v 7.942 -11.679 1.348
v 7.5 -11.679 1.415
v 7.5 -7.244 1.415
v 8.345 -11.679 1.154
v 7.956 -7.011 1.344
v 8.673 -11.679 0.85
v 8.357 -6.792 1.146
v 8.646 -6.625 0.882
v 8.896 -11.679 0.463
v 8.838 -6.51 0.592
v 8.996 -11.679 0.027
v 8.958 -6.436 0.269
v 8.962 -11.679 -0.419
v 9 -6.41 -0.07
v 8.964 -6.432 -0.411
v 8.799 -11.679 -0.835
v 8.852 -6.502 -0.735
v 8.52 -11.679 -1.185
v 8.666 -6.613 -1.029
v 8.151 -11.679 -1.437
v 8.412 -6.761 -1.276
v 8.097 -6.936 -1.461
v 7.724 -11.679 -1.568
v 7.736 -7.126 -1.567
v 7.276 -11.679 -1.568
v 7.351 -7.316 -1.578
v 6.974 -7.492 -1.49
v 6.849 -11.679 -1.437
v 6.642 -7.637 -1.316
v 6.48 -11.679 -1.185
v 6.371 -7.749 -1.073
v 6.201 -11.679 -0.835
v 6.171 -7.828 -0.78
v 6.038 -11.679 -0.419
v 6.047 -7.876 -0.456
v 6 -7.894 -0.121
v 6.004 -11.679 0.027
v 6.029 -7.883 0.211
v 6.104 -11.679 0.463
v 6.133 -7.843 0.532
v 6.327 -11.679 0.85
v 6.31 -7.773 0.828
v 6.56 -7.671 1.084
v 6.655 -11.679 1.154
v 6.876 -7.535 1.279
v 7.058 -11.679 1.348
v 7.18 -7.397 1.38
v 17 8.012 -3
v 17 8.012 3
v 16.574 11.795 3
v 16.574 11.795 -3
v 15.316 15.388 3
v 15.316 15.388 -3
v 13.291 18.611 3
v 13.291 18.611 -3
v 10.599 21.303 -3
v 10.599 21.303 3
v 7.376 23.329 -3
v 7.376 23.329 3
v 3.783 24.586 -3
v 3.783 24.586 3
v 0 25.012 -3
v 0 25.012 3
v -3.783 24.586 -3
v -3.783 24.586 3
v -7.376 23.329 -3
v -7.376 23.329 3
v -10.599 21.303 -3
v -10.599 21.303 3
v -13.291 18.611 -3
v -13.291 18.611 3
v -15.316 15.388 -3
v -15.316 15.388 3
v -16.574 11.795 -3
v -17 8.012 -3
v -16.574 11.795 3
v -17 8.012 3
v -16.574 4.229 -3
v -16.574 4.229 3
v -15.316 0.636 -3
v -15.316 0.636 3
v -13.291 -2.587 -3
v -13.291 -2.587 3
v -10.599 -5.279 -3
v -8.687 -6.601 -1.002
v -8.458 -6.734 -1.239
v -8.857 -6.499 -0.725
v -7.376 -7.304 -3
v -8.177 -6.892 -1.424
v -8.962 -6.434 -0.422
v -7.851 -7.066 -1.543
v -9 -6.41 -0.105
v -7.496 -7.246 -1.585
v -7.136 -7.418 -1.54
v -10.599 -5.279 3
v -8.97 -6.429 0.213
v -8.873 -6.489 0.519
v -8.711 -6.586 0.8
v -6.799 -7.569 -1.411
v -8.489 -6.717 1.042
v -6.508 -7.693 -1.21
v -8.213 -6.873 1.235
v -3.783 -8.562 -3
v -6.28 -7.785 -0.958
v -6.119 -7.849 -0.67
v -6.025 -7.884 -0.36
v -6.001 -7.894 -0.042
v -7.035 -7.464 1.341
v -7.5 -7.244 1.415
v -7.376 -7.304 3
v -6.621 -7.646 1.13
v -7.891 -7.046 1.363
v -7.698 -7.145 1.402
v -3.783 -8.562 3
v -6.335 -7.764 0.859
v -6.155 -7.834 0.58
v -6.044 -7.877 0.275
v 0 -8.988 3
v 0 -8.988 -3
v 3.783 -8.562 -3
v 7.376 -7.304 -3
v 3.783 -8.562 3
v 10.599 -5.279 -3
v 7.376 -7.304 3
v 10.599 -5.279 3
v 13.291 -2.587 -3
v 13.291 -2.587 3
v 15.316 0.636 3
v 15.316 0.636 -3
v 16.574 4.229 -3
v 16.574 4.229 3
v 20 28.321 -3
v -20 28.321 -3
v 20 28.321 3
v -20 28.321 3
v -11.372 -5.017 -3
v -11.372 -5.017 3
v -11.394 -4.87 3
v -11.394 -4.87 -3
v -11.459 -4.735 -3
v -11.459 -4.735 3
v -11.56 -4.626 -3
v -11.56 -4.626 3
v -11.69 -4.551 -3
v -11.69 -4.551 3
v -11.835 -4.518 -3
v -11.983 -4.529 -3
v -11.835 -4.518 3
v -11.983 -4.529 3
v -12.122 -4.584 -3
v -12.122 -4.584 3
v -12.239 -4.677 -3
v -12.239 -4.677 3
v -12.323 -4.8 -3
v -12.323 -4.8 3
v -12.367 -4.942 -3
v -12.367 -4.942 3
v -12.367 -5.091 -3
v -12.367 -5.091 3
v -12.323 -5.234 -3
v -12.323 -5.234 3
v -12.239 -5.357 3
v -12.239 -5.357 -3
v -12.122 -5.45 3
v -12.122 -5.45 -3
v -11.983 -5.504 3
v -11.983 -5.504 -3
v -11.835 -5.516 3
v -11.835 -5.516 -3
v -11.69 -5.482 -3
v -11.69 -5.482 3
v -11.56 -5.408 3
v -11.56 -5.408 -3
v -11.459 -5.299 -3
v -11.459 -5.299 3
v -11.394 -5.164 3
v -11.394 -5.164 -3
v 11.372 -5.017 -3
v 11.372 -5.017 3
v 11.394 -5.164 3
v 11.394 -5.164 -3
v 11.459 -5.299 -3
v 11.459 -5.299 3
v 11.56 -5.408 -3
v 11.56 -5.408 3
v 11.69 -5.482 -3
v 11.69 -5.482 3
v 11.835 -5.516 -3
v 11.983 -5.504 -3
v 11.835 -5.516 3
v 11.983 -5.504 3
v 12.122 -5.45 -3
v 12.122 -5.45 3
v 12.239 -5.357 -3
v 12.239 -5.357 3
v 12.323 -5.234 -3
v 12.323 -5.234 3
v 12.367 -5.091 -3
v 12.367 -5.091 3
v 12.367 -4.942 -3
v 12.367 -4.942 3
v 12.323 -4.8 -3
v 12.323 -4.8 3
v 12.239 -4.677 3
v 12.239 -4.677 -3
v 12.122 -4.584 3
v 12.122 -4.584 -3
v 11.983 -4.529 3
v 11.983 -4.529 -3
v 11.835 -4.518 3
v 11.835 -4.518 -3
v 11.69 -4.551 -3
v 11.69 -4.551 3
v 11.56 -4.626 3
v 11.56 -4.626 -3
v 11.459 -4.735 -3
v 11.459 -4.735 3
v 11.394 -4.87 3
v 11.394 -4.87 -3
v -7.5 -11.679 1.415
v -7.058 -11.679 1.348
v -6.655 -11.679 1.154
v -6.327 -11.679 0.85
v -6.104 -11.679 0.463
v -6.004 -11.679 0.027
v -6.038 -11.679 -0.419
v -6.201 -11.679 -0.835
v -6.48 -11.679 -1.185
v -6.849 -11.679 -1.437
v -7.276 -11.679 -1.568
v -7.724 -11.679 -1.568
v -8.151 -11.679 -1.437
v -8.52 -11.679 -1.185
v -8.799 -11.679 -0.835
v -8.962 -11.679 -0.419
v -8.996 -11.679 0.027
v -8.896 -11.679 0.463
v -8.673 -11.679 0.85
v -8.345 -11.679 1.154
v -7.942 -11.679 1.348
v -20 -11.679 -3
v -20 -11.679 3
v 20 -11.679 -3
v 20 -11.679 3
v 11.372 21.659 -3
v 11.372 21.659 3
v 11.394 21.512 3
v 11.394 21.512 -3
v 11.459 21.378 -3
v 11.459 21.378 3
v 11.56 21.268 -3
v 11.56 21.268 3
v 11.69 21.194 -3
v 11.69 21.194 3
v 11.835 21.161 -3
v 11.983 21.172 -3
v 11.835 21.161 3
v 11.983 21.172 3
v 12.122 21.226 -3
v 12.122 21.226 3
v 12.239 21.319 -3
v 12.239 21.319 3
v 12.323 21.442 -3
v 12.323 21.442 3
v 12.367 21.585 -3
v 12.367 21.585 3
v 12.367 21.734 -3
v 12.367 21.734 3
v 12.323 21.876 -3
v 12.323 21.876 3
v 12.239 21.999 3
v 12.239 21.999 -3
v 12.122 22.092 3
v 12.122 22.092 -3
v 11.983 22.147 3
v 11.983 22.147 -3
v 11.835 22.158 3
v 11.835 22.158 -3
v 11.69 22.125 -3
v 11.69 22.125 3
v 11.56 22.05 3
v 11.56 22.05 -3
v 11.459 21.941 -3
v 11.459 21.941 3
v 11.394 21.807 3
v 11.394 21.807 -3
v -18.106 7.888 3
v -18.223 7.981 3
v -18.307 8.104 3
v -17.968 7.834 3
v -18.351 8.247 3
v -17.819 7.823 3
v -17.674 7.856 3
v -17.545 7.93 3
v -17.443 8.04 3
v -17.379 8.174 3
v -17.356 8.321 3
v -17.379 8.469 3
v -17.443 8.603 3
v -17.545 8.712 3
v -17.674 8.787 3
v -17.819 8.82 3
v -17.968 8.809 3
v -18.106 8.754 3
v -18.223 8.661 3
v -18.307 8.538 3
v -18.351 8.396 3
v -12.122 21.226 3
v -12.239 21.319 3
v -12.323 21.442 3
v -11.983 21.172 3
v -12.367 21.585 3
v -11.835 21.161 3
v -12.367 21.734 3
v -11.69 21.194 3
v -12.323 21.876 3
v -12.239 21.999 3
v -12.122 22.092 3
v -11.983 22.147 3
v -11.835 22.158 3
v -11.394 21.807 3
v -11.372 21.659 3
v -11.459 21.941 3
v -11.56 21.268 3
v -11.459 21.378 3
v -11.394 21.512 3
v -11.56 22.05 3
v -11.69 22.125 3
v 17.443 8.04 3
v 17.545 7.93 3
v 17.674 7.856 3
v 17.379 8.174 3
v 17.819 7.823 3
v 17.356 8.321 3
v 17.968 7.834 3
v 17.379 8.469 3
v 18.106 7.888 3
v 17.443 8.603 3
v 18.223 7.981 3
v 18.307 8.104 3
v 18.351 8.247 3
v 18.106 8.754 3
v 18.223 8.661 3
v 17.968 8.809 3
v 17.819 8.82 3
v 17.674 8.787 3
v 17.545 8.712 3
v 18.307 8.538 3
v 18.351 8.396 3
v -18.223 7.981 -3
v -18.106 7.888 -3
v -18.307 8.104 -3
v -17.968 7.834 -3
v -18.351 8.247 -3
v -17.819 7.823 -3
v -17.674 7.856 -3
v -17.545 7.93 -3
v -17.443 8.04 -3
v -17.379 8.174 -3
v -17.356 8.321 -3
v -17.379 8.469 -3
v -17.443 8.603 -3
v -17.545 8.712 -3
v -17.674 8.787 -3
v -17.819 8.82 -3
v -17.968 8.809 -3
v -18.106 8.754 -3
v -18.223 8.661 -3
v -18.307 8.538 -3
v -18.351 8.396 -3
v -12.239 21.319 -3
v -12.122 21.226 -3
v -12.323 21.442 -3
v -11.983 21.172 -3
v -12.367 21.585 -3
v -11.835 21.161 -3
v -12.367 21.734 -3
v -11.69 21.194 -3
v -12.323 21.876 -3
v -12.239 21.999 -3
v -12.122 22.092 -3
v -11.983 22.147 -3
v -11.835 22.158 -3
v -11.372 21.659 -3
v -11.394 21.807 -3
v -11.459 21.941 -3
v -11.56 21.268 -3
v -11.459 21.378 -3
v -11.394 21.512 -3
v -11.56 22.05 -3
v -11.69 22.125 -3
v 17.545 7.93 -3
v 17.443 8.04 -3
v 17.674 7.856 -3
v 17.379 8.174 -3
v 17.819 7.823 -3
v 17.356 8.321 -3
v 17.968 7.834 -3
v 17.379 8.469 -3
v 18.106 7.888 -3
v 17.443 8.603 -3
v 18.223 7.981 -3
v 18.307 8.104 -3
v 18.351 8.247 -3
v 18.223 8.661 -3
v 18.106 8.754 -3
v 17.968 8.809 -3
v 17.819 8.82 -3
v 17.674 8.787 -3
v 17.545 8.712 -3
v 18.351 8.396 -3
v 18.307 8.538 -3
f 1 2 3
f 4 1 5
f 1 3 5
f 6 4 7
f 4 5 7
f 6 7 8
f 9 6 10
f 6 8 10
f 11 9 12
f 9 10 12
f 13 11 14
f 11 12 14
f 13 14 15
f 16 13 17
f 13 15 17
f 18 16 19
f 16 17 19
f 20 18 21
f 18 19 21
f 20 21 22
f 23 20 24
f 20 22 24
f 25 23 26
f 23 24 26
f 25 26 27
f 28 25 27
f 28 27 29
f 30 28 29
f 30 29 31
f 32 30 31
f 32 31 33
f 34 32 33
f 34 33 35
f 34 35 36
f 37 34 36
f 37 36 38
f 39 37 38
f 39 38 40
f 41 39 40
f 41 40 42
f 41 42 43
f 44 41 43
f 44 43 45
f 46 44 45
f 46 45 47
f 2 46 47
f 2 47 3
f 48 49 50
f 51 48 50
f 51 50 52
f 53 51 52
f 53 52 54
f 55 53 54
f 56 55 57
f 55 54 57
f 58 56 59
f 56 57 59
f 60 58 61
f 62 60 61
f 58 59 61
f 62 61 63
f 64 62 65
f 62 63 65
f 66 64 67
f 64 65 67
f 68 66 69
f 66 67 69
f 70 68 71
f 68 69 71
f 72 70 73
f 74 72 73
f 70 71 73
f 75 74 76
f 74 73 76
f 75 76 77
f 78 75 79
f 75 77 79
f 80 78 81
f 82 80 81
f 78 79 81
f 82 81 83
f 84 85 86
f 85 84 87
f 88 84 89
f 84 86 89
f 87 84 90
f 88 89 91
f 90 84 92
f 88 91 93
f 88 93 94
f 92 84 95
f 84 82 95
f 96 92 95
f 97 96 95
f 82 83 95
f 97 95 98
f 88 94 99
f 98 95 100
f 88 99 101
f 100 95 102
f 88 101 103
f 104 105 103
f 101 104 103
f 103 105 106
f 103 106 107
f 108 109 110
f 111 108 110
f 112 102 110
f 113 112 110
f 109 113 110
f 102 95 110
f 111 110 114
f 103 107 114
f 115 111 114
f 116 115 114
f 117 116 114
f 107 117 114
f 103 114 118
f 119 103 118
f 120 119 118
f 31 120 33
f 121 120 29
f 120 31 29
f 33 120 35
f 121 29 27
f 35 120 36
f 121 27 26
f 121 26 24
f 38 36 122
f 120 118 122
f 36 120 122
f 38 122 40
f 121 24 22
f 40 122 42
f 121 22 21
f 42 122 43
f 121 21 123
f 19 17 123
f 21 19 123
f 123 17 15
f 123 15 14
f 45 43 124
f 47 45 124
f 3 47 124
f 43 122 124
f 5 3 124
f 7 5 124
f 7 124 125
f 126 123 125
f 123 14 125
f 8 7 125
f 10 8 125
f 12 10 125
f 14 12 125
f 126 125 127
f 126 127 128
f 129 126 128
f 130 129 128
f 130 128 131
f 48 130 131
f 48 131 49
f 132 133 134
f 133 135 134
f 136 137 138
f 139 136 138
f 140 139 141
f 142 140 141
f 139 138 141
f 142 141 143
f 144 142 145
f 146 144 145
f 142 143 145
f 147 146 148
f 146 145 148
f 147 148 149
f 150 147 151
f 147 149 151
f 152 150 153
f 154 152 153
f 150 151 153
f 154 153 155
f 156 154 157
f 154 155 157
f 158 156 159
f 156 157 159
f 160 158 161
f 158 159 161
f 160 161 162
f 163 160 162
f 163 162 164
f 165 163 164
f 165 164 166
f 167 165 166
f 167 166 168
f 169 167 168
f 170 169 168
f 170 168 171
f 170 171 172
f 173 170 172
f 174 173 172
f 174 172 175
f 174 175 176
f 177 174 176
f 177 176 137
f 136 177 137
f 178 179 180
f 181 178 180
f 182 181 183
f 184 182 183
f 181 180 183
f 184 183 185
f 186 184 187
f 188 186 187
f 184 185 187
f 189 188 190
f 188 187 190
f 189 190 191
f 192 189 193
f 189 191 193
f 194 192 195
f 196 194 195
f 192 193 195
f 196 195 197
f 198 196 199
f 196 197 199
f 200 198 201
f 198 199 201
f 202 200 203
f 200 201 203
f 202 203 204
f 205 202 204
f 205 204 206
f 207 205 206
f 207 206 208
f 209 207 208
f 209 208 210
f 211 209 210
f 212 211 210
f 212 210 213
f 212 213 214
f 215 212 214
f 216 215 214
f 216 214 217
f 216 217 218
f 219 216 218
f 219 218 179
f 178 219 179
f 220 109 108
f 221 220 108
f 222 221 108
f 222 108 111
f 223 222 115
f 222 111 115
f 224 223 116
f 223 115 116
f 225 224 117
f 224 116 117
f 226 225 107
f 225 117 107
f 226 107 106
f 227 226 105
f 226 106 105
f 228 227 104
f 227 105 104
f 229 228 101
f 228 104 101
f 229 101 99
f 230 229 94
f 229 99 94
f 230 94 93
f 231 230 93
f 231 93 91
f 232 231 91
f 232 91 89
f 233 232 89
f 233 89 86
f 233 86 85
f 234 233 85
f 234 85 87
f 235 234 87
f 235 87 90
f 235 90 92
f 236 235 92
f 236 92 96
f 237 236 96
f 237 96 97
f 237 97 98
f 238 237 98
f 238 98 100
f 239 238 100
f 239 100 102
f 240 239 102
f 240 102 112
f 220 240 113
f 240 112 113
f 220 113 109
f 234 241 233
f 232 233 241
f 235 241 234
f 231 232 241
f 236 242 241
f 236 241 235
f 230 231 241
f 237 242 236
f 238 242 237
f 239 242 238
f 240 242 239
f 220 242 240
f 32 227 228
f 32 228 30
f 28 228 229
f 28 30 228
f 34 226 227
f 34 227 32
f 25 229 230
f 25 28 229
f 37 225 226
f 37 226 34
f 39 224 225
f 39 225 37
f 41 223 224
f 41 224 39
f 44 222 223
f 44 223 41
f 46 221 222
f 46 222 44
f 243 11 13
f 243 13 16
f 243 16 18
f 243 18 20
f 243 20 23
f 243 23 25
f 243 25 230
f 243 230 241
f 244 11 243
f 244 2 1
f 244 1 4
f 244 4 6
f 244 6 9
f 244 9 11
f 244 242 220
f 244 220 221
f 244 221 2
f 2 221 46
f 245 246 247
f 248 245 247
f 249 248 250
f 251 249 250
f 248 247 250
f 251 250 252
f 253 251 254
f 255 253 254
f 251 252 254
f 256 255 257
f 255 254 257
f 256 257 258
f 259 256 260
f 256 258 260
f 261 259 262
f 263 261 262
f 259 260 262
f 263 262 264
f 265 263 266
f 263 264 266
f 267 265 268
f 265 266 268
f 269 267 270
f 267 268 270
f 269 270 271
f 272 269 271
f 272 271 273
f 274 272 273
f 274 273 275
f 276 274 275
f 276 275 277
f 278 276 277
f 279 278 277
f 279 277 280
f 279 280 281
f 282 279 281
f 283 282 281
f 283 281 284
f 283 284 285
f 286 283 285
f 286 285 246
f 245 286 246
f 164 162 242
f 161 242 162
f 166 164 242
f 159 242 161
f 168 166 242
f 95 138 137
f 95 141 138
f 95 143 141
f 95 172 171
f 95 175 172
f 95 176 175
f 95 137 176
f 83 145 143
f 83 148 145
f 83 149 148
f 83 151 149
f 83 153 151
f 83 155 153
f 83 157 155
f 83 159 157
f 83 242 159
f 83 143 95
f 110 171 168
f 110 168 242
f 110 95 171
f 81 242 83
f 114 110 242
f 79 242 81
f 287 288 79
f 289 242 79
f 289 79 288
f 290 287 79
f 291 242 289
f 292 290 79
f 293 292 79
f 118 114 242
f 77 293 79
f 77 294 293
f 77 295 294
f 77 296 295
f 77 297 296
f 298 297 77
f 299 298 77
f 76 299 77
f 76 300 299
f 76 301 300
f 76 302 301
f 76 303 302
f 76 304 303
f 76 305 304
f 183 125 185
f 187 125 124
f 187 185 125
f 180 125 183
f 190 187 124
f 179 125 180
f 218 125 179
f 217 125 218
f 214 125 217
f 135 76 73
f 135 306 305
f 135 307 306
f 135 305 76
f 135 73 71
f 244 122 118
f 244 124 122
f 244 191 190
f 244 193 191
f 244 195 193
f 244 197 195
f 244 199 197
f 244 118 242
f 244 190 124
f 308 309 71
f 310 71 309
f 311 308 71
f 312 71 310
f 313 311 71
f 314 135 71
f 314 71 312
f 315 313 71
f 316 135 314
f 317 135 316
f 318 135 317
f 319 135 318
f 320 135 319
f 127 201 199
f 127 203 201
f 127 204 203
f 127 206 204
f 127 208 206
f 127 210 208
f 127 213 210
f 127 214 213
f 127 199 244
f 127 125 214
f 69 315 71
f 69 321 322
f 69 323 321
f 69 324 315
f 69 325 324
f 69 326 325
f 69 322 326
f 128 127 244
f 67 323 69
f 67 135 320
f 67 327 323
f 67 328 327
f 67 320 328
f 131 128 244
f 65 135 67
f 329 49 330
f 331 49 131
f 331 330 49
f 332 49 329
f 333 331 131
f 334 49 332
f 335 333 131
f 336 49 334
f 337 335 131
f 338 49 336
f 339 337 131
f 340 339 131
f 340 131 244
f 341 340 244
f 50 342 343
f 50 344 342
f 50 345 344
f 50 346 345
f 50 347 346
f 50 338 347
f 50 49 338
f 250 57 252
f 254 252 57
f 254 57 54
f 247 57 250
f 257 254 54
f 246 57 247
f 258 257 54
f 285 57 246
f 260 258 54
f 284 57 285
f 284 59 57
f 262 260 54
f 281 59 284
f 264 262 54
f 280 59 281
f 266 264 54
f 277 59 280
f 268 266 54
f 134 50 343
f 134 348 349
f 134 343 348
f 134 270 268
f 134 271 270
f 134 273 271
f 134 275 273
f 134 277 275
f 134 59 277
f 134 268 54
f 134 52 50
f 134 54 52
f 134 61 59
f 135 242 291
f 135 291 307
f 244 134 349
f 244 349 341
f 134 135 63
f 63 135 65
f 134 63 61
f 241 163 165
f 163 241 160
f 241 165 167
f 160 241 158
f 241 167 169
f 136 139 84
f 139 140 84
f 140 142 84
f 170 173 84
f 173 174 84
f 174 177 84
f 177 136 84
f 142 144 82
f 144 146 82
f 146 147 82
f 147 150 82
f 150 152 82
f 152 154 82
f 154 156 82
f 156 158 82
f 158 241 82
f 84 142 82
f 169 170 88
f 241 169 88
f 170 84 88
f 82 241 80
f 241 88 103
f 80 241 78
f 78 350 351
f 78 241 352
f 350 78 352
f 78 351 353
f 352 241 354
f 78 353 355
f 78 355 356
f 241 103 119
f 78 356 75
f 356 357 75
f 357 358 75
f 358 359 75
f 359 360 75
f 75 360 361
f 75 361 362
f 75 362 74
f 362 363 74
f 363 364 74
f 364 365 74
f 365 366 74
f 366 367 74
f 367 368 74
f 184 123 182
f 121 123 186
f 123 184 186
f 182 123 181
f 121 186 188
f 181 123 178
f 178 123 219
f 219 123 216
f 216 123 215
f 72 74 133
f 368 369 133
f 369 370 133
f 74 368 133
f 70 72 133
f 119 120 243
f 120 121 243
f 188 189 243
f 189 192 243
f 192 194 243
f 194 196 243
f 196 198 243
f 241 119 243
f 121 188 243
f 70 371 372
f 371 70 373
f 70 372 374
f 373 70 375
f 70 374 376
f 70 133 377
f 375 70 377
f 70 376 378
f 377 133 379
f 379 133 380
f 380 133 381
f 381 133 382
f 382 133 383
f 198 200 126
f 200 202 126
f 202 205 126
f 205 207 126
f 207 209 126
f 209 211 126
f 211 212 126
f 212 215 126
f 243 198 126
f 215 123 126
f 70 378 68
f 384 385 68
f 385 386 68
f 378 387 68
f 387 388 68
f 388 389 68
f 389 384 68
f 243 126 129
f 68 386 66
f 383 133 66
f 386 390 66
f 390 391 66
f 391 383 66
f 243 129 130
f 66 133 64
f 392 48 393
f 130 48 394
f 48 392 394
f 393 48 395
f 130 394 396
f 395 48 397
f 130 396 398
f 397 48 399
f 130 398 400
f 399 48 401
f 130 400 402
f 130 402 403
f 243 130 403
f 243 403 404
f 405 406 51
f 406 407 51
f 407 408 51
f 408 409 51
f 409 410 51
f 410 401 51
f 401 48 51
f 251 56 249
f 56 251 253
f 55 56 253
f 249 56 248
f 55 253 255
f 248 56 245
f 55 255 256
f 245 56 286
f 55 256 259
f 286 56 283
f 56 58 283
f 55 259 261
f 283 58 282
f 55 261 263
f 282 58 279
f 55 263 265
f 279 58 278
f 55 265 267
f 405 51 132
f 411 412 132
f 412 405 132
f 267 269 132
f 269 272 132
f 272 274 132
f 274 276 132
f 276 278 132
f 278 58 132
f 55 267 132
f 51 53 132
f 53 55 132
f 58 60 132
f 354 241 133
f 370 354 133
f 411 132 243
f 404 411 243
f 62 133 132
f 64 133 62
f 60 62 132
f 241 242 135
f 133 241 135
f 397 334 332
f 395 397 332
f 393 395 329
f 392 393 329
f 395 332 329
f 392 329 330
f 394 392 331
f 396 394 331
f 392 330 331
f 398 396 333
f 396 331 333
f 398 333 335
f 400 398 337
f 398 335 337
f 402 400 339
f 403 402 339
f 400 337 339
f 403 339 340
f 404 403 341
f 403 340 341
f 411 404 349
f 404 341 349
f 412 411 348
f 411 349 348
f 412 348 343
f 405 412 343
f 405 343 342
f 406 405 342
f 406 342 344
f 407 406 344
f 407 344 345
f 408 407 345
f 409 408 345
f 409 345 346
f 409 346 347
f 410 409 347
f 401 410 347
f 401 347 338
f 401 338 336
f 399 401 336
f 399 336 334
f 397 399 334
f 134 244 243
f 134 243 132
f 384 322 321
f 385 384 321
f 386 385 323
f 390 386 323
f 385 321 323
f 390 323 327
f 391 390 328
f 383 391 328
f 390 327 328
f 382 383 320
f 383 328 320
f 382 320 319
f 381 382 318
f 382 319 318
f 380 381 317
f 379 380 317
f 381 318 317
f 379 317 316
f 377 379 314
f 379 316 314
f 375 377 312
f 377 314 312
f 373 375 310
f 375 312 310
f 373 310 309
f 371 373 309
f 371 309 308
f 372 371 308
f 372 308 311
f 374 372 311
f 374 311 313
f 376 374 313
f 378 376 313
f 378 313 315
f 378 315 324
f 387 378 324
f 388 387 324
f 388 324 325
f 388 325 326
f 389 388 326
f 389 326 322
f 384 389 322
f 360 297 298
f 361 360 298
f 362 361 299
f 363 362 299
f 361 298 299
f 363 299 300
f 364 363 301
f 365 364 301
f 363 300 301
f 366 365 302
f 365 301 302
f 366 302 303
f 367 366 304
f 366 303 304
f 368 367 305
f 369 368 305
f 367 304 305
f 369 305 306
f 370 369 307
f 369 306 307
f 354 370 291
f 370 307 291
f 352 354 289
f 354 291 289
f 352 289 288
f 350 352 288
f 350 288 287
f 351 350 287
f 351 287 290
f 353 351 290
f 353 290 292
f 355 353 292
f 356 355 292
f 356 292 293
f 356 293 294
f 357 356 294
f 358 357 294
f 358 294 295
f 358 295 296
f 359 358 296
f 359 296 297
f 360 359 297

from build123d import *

# Parameters (mm, degrees)
SKETCH1_W           = 40
SKETCH1_H           = 40
BOSS_EXTRUDE1_DEPTH = 3
SKETCH3_R           = 0.5
CUT_EXTRUDE1_DEPTH  = 40
SKETCH4_R           = 1.5
CUT_EXTRUDE3_DEPTH  = 30
SKETCH5_R           = 17
CUT_EXTRUDE7_DEPTH  = 36.186486738


with BuildPart() as part:
    # Sketch1 → Boss-Extrude1 (new, symmetric)
    with BuildSketch(Plane.XY):
        with Locations((0, 8.321173156)):
            Rectangle(SKETCH1_W, SKETCH1_H)
    extrude(amount=BOSS_EXTRUDE1_DEPTH, both=True)

    # Sketch3 → Cut-Extrude1 (cut)
    with BuildSketch(Plane.XY.offset(3)):
        with Locations((-11.872178248, 21.659280154)):
            Circle(SKETCH3_R)
        with Locations((-17.856475427, 8.321173156)):
            Circle(SKETCH3_R)
        with Locations((-11.872178248, -5.016933842)):
            Circle(SKETCH3_R)
        with Locations(Location((11.872178248, -5.016933842, 0), (0, 0, 180))):
            Circle(SKETCH3_R)
        with Locations(Location((17.856475427, 8.321173156, 0), (0, 0, 180))):
            Circle(SKETCH3_R)
        with Locations(Location((11.872178248, 21.659280154, 0), (0, 0, 180))):
            Circle(SKETCH3_R)
    extrude(amount=-CUT_EXTRUDE1_DEPTH, mode=Mode.SUBTRACT)

    # Sketch4 → Cut-Extrude3 (cut)
    with BuildSketch(Plane(origin=(0, 0, 0), x_dir=(1, 0, 0), z_dir=(0, 1, 0))):
        with Locations(Location((-7.5, 0.085145046, 0), (0, 0, 270))):
            Circle(SKETCH4_R)
        with Locations(Location((7.5, 0.085145046, 0), (0, 0, 270))):
            Circle(SKETCH4_R)
    extrude(amount=-CUT_EXTRUDE3_DEPTH, mode=Mode.SUBTRACT)

    # Sketch5 → Cut-Extrude7 (cut, through all)
    with BuildSketch(Plane.XY.offset(3)):
        with Locations((0, 8.01211428)):
            Circle(SKETCH5_R)
    extrude(amount=-CUT_EXTRUDE7_DEPTH, mode=Mode.SUBTRACT)


solid = part.part
